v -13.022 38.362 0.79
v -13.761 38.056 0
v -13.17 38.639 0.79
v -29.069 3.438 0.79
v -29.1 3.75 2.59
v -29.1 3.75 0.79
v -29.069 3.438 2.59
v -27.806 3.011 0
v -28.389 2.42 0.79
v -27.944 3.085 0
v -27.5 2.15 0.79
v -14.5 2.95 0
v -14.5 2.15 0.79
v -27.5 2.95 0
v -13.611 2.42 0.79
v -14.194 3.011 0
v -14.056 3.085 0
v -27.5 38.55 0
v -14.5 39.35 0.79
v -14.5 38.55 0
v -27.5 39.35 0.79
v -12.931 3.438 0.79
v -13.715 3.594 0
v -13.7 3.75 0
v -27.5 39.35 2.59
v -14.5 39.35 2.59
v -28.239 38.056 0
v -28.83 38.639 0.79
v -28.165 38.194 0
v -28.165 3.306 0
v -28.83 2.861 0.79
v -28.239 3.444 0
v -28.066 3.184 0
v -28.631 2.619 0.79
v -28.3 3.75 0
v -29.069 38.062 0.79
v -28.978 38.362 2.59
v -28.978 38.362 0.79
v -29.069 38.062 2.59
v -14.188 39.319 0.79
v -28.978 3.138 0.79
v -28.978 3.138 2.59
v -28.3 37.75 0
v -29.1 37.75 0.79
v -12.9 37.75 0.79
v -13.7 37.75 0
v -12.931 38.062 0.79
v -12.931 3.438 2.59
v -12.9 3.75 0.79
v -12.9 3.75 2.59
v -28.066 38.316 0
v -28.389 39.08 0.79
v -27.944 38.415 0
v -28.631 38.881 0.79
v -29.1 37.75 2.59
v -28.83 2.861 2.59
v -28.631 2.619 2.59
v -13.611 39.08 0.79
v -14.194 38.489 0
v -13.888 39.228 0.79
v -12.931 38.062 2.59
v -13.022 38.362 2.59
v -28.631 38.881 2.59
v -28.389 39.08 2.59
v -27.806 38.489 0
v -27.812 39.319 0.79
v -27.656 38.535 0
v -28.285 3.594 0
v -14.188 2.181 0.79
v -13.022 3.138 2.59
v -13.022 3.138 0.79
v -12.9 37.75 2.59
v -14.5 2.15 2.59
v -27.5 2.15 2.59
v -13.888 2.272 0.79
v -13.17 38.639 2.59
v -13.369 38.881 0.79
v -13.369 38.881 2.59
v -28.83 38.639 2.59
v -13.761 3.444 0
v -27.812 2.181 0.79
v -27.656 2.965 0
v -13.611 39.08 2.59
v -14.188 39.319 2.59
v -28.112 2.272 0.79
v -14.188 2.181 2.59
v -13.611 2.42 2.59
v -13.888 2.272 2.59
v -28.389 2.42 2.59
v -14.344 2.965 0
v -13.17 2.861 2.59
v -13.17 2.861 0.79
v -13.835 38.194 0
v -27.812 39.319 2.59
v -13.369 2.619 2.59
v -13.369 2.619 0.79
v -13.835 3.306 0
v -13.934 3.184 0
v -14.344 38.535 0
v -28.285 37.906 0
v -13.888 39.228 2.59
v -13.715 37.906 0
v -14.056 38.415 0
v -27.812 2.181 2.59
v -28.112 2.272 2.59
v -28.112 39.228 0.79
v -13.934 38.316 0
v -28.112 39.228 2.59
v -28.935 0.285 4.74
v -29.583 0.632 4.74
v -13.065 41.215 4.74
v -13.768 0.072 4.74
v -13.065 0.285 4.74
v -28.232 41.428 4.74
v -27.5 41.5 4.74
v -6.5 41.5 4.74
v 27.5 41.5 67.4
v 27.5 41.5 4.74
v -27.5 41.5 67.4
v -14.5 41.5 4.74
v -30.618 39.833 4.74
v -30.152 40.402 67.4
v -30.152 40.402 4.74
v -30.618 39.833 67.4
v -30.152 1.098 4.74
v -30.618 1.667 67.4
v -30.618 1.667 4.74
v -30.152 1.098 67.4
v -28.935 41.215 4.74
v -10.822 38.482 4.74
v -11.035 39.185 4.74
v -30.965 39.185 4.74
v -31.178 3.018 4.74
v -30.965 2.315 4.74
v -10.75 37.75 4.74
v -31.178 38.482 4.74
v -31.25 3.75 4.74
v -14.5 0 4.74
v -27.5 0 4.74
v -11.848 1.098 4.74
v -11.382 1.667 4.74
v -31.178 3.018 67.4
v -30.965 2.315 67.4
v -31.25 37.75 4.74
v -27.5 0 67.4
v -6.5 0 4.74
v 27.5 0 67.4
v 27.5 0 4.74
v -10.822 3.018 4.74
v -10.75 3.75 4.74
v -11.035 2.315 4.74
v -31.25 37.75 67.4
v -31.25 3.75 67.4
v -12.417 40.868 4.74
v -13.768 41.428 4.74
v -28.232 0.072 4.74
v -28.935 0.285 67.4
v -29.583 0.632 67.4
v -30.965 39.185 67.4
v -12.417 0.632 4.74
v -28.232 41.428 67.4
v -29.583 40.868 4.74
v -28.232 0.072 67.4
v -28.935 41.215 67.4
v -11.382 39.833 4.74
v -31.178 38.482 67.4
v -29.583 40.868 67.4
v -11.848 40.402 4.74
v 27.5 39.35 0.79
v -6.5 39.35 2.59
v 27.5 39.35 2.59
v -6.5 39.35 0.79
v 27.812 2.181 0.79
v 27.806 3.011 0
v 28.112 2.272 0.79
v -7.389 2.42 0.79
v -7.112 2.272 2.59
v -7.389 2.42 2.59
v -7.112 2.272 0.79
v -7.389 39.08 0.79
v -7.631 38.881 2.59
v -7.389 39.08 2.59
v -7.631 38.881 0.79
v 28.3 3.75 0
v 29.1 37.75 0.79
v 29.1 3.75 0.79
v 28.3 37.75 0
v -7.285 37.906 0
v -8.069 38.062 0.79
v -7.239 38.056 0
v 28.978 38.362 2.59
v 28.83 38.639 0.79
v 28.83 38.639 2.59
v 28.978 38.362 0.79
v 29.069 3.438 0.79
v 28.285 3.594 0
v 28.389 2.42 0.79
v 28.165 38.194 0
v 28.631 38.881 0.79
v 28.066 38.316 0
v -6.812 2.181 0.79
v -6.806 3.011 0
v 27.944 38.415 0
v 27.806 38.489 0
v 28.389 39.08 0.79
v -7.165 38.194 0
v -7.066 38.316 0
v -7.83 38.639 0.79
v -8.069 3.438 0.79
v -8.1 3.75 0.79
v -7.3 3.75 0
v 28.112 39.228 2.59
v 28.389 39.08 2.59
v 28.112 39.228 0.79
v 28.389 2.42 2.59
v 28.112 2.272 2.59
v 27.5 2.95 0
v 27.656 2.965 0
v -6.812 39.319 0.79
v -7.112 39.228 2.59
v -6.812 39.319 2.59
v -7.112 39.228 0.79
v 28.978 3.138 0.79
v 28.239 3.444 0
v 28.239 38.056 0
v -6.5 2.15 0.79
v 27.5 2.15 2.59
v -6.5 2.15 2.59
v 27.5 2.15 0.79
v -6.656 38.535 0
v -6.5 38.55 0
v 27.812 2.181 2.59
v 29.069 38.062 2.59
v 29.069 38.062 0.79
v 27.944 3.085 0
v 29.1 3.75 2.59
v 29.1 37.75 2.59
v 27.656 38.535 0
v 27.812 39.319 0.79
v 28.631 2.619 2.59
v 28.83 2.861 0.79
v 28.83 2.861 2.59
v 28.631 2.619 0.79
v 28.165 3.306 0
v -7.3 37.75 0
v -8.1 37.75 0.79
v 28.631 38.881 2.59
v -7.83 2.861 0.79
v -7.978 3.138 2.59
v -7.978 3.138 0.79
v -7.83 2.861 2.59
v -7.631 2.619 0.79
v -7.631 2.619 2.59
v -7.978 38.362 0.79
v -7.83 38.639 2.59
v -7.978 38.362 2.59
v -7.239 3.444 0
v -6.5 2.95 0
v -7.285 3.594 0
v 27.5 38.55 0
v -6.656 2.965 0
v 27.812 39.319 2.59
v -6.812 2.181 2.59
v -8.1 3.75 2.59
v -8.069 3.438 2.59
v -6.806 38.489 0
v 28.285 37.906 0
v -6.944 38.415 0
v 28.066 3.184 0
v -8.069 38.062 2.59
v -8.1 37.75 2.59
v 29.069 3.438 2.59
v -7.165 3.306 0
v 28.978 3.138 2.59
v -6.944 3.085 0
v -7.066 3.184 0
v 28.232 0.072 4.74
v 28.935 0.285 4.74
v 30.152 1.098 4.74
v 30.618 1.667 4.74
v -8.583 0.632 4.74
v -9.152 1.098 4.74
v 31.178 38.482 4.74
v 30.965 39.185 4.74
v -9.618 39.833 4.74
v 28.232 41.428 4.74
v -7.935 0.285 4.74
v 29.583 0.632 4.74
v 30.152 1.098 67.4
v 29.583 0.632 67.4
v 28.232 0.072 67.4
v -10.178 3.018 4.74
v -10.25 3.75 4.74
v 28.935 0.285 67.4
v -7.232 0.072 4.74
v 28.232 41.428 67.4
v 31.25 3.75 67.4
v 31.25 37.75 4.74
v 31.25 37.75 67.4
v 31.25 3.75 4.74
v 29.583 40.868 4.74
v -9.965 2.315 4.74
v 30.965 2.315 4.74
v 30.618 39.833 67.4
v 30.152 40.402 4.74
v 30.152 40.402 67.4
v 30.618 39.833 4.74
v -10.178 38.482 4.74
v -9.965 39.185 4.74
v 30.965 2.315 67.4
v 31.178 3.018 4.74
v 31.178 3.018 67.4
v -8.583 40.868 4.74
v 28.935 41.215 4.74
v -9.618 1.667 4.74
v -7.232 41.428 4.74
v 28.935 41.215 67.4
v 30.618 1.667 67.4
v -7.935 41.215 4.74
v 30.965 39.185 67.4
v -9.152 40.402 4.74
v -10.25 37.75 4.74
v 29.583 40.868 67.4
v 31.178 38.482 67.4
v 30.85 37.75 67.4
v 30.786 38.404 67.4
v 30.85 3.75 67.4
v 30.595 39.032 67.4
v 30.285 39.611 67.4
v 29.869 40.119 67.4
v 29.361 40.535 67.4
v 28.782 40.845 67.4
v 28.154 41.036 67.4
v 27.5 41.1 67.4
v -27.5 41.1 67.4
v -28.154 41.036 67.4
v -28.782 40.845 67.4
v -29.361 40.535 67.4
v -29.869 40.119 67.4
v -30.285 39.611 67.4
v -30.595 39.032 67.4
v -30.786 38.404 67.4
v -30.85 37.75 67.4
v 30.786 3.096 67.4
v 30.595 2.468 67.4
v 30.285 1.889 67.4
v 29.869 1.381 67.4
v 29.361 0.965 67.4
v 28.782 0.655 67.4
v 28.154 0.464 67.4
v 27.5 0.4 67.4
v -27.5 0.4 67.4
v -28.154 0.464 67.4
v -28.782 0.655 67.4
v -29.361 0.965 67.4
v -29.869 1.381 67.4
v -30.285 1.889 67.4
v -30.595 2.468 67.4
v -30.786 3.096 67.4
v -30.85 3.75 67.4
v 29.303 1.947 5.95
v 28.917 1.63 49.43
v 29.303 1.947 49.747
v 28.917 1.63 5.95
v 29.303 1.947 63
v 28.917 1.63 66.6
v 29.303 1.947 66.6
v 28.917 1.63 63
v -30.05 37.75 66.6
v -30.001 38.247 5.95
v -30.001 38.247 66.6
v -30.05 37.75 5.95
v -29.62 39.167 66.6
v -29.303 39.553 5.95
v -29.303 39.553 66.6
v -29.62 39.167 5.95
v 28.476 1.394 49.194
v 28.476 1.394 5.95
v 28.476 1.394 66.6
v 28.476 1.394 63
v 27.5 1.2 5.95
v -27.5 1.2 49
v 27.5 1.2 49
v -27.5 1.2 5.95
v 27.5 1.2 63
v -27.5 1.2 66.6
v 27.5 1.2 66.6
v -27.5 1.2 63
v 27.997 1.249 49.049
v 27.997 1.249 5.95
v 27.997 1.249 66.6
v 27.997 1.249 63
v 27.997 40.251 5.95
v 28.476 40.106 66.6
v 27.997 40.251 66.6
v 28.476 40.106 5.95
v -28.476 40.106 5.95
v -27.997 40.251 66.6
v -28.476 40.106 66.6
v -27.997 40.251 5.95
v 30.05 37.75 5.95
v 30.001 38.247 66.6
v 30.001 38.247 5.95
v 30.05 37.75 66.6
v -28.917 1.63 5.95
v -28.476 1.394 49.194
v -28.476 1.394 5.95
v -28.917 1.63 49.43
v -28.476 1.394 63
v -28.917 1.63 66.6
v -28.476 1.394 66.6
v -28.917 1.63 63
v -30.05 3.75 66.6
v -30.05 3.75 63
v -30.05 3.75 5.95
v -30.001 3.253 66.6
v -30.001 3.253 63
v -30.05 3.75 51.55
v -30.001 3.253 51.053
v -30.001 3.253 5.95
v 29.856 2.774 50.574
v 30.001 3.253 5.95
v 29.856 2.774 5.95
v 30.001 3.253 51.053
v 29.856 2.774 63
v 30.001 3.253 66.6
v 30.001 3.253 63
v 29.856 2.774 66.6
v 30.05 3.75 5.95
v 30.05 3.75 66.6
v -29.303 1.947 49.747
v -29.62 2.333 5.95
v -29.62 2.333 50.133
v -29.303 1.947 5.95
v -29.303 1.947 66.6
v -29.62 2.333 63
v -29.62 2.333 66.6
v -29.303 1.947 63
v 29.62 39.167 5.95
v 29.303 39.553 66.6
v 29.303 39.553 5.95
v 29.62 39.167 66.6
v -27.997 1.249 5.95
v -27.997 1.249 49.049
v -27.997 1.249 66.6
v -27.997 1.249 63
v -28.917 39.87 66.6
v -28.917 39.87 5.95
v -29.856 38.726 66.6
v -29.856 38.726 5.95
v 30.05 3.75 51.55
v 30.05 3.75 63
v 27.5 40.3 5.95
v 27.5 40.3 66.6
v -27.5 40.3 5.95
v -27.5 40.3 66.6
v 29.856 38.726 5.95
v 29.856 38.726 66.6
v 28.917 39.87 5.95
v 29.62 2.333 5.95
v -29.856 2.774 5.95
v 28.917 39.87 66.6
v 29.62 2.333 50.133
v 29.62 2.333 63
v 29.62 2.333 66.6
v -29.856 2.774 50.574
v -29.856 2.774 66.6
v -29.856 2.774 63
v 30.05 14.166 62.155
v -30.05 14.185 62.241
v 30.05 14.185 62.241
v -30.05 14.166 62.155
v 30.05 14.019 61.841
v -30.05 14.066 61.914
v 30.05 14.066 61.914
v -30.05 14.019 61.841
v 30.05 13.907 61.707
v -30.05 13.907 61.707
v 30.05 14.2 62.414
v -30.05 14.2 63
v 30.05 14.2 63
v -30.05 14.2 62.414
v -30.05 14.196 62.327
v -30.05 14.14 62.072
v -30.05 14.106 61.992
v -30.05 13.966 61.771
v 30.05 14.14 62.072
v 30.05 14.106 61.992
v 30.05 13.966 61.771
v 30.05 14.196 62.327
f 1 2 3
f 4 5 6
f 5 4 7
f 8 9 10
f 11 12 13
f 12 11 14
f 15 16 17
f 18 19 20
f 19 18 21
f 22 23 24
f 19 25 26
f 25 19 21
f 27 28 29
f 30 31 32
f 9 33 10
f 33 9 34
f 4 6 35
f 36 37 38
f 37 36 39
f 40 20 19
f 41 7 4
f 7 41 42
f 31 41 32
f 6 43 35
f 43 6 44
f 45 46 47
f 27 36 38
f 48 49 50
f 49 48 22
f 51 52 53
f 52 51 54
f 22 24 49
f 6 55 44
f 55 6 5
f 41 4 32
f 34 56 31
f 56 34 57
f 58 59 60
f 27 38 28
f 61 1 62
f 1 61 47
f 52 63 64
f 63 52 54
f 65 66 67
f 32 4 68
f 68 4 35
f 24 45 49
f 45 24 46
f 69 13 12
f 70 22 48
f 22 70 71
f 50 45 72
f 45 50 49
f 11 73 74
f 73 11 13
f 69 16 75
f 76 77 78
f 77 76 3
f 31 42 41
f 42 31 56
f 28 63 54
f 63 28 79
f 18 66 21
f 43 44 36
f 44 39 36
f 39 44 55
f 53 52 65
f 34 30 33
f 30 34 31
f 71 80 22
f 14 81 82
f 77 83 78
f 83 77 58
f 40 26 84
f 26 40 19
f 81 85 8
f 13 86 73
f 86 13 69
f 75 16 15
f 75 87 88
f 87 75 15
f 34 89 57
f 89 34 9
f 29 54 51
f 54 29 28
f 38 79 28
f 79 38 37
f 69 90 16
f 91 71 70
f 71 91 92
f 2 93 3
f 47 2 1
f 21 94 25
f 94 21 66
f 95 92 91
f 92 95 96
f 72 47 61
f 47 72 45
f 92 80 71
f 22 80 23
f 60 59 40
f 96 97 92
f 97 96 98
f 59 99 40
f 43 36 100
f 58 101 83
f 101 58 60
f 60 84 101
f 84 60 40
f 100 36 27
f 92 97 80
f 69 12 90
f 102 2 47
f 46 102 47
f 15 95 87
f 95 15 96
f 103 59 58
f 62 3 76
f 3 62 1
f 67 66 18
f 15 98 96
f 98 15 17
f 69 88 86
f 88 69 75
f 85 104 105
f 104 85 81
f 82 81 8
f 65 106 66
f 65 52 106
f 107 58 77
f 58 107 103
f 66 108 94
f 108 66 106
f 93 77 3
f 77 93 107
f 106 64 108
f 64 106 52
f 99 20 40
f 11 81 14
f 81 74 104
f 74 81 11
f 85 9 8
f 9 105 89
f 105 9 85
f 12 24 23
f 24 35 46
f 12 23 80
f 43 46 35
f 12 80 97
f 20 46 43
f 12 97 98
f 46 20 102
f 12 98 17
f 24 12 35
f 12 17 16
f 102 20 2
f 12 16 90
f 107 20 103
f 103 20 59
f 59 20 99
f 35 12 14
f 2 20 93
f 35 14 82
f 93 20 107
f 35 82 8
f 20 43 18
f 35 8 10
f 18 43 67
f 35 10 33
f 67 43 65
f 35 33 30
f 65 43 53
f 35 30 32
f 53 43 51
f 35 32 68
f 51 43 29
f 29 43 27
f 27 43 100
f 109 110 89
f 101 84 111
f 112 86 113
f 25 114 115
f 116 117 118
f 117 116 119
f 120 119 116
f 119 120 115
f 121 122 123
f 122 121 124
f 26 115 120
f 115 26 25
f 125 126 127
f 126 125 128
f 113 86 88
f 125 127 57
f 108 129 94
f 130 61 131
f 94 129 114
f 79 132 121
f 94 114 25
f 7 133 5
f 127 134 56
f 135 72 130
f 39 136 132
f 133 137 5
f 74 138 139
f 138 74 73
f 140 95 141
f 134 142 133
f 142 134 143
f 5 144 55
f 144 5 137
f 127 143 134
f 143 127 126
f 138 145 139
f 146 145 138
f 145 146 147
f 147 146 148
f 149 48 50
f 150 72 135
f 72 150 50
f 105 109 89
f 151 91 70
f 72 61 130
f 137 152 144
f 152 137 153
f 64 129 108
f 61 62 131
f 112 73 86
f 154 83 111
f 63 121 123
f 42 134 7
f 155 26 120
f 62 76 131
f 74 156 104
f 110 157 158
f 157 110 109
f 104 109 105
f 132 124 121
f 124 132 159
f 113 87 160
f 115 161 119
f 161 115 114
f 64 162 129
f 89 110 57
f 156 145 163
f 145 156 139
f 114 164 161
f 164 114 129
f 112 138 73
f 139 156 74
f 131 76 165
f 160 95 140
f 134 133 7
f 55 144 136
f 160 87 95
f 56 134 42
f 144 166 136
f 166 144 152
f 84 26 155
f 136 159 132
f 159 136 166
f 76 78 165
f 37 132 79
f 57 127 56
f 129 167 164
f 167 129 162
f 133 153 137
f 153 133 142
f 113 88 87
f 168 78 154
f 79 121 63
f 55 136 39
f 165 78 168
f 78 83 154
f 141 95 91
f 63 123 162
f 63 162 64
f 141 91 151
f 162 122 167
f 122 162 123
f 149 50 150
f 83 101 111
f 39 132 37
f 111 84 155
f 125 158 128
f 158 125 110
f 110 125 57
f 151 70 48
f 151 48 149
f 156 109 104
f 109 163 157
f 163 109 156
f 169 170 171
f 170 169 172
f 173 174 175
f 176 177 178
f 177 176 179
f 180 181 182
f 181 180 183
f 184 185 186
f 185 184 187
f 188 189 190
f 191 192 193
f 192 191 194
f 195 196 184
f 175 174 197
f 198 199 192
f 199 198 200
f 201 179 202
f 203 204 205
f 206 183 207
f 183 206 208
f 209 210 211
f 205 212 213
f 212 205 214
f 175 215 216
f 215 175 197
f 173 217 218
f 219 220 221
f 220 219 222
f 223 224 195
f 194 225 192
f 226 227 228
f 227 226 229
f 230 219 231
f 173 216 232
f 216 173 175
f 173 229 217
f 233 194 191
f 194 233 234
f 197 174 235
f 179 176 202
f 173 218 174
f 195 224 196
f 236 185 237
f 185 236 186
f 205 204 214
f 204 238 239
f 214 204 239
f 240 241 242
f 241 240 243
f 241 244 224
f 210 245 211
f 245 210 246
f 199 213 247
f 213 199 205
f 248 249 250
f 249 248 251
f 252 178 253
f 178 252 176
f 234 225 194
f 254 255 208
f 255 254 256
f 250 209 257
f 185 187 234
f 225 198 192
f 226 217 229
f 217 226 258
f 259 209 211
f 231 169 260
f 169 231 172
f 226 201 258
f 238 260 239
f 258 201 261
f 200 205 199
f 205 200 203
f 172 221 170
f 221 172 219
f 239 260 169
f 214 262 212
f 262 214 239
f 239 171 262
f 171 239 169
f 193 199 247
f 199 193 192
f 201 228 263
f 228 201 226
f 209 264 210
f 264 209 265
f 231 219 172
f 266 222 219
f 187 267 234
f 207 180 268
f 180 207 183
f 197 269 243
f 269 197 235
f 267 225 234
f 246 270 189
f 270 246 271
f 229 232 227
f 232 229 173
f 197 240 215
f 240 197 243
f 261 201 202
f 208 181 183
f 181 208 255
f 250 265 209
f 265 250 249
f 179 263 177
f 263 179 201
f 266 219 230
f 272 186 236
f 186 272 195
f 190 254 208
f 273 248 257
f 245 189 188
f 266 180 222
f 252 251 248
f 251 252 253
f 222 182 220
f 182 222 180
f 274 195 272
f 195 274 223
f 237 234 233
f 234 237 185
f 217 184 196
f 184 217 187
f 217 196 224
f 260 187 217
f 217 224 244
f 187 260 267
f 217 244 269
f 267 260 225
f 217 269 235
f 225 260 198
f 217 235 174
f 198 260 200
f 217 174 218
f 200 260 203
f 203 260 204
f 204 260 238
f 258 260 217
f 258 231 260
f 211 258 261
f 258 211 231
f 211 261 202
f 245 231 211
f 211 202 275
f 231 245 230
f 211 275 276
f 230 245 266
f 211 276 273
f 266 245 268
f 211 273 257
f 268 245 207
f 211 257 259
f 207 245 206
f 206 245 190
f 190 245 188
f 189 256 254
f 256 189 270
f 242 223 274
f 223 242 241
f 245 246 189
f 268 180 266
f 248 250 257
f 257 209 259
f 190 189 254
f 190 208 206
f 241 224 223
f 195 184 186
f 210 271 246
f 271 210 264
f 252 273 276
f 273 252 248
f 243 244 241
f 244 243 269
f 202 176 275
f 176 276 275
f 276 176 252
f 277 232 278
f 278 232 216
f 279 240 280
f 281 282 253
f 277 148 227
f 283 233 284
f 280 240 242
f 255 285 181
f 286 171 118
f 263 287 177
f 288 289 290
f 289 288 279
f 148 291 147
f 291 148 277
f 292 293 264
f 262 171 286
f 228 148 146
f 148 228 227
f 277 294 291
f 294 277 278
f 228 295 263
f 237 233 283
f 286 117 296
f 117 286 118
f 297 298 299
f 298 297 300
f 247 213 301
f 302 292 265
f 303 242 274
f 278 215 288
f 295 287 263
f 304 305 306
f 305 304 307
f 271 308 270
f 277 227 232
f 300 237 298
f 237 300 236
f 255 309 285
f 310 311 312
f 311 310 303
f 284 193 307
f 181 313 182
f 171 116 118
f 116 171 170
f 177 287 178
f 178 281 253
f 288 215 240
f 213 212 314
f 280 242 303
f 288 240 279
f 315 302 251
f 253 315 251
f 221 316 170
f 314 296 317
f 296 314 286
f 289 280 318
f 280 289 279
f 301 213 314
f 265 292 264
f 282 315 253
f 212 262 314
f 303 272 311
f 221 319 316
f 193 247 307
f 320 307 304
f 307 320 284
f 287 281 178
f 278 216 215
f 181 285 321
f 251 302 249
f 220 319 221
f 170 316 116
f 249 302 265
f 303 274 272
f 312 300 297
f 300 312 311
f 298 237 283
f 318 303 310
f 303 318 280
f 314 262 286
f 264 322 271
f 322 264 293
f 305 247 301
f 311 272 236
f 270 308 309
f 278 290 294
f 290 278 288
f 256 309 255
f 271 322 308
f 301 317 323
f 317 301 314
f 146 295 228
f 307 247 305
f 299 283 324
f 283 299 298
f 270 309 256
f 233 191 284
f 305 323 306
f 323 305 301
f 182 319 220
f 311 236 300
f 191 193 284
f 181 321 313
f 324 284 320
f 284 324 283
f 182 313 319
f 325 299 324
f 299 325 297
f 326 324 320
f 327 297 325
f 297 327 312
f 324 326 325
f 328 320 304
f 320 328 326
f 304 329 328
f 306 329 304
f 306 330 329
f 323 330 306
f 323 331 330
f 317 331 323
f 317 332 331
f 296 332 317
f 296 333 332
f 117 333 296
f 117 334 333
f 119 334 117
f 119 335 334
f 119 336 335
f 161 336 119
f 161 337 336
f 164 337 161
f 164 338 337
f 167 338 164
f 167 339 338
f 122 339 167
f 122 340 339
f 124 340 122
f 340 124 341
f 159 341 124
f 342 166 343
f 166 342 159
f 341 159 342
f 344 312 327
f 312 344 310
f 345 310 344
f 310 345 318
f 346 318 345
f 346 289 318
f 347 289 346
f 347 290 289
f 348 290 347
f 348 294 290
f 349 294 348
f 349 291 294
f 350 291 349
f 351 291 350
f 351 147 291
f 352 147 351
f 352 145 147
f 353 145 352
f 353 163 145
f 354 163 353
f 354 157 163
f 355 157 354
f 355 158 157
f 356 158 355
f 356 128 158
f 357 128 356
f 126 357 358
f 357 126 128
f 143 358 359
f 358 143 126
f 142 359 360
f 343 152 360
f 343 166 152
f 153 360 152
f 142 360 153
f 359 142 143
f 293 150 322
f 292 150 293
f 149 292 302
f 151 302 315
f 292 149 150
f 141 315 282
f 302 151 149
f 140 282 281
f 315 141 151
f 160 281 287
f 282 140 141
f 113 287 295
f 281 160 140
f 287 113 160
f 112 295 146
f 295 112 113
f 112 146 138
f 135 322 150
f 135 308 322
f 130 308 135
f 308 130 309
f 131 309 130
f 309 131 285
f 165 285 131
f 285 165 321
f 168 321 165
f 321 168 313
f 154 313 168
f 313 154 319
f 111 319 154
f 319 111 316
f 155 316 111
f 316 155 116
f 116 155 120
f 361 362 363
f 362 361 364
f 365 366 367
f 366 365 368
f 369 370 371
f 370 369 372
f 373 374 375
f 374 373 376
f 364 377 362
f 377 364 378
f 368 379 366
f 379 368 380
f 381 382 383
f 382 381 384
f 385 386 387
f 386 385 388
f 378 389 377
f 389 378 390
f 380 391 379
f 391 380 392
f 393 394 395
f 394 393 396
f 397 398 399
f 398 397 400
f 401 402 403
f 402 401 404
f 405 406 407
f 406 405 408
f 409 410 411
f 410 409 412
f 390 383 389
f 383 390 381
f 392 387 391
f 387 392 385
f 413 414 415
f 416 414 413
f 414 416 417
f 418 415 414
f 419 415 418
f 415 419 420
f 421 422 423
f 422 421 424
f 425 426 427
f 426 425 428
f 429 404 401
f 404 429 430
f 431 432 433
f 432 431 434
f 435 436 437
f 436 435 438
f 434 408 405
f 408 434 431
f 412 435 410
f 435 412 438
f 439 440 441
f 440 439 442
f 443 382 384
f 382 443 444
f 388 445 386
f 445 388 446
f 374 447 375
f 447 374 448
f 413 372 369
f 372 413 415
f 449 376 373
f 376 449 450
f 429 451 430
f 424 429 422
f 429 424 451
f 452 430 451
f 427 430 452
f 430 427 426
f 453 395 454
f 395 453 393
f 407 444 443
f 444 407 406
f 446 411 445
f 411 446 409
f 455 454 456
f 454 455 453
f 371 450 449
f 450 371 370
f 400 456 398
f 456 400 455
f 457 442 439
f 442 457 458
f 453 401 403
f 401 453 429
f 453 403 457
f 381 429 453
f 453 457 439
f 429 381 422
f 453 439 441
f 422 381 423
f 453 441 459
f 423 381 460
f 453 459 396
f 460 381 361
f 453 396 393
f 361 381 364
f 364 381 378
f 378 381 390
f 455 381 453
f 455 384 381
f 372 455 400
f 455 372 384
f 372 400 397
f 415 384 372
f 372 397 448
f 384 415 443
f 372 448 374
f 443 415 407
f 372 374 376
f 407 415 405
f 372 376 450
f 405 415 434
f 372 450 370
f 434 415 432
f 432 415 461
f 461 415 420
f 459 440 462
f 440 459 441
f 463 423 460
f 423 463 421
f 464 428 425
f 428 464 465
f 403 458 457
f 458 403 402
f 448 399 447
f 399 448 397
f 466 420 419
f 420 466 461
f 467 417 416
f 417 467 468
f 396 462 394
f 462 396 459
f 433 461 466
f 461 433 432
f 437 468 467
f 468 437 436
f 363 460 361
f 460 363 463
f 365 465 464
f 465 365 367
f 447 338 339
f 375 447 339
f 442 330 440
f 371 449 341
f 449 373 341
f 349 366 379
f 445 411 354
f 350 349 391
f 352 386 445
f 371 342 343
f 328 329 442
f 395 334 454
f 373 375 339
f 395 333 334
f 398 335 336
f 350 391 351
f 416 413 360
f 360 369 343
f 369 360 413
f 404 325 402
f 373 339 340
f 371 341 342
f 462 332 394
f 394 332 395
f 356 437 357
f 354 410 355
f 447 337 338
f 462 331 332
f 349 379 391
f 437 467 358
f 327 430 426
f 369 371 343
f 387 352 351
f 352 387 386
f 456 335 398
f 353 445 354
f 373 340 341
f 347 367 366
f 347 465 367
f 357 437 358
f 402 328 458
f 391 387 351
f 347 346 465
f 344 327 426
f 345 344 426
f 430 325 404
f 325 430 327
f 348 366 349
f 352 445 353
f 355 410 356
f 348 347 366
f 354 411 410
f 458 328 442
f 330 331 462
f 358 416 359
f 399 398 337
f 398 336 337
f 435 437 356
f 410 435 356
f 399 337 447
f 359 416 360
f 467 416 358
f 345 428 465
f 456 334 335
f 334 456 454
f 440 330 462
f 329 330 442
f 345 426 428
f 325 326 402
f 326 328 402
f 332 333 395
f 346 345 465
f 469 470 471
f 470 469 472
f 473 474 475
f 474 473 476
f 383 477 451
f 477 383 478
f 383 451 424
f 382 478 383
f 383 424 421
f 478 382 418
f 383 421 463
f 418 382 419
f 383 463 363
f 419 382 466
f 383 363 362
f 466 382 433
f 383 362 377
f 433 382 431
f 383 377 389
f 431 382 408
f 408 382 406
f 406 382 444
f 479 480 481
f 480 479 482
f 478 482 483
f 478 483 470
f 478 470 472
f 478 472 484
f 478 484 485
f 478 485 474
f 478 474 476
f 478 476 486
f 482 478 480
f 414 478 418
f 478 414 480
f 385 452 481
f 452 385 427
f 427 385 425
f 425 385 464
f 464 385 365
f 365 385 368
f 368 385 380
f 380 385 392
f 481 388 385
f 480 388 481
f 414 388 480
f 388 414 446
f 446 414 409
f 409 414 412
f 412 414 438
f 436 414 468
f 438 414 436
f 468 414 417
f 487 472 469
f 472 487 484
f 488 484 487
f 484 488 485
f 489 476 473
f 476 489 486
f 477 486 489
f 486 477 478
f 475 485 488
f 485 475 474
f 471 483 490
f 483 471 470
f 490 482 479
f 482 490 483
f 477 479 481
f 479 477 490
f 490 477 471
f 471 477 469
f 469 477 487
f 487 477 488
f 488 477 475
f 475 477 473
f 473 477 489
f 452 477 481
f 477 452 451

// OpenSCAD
// file: ../../../modules/gridfinity.scad
// Gridfinity ベースプレートの共有 module。
// 寸法は Gridfinity 仕様 (Zack Freedman) の baseplate 輪郭に従う:
//   ピッチ 42、ソケット上端開口 41.5 (角 R4)、上から 45° 面取り 2.15 →
//   垂直 1.8 (37.2 角・R1.85) → 45° 面取り 0.7 → 底 35.8 角 (R1.15)。
//   ソケット深さ = 2.15 + 1.8 + 0.7 = 4.65。
//
// 座標系: X が列方向 (中央が 0)、Y が行方向 (板の前端が 0)、Z=0 が板の底面。
// 板の外形は grid とは独立に rim で与えるので、grid より大きい板 (縁付き) を
// 作れる。ソケットは rim=[left, right, front, back] の内側へ 42 ピッチで並ぶ。

gf_pitch = 42;
gf_socket_top = 41.5; // 上端開口
gf_socket_mid = 37.2; // 垂直部
gf_socket_bot = 35.8; // 底
gf_socket_r_top = 4;
gf_socket_r_mid = 1.85;
gf_socket_r_bot = 1.15;
gf_chamfer_top = 2.15;
gf_wall_h = 1.8;
gf_chamfer_bot = 0.7;
gf_socket_depth = gf_chamfer_top + gf_wall_h + gf_chamfer_bot; // 4.65
gf_fn = 32;
gf_eps = 0.01; // hull 用の薄板の厚さ
gf_over = 0.5; // 切削の抜き代

// 角丸正方形または矩形 (w は一辺、または [幅, 奥行き]、角 R)
module
gf_rounded_square(w, r)
{
    offset(r = r, $fn = gf_fn)
        square(is_list(w) ? w - [ 2 * r, 2 * r ] : w - 2 * r, center = true);
}

// 厚さ gf_eps の角丸正方形の薄板を z に置く (hull の骨)
module
gf_slab(w, r, z)
{
    translate([ 0, 0, z ]) linear_extrude(gf_eps) gf_rounded_square(w, r);
}

// ソケット1個の切削体。z=0 がソケットの底 (床の天面)、+Z へ 4.65 で天面に出る。
// clearance は嵌合の逃げで、輪郭を全周へ clearance だけ外へ出す (幅 +2c、角 R
// +c)。pitch_x は X 方向のセル幅。端数でも角 R と面取りの寸法を保つ。
module
gf_socket_cut(clearance = 0, pitch_x = gf_pitch)
{
    z1 = gf_chamfer_bot;
    z2 = z1 + gf_wall_h;
    z3 = gf_socket_depth;
    c = clearance;
    assert(pitch_x > gf_pitch - gf_socket_top + 2 * gf_socket_r_top,
           "Cell width is too small for the socket corner radius");
    delta = [ pitch_x - gf_pitch, 0 ];
    bot = [ gf_socket_bot + 2 * c, gf_socket_bot + 2 * c ] + delta;
    mid = [ gf_socket_mid + 2 * c, gf_socket_mid + 2 * c ] + delta;
    top = [ gf_socket_top + 2 * c, gf_socket_top + 2 * c ] + delta;
    hull()
    {
        gf_slab(bot, gf_socket_r_bot + c, 0);
        gf_slab(mid, gf_socket_r_mid + c, z1 - gf_eps);
    }
    hull()
    {
        gf_slab(mid, gf_socket_r_mid + c, z1 - gf_eps);
        gf_slab(mid, gf_socket_r_mid + c, z2 - gf_eps);
    }
    hull()
    {
        gf_slab(mid, gf_socket_r_mid + c, z2 - gf_eps);
        gf_slab(top, gf_socket_r_top + c, z3 - gf_eps);
    }
    // 天面より上へ抜く (天面と同一平面の退化した面を残さない)
    gf_slab(top, gf_socket_r_top + c, z3 - gf_eps);
    translate([ 0, 0, z3 - gf_eps ]) linear_extrude(gf_over + gf_eps)
        gf_rounded_square(top, gf_socket_r_top + c);
}

// ベースプレート。cols x rows のソケットを床 floor_t の上に彫る。
// rim = [left, right, front, back] はソケット列の外側に残す縁の幅。
// 板の幅 = cols*42 + left + right、奥行き = rows*42 + front + back。
// cols の端数は左端の細幅セルになる。rows は正の整数。
// clearance はソケットの嵌合の逃げ (gf_socket_cut を参照)。
module
gf_baseplate(cols, rows, rim = [ 0, 0, 0, 0 ], floor_t = 1, clearance = 0)
{
    grid_w = cols * gf_pitch;
    grid_d = rows * gf_pitch;
    plate_w = grid_w + rim[0] + rim[1];
    plate_d = grid_d + rim[2] + rim[3];
    x0 = -plate_w / 2 + rim[0]; // ソケット列の左端
    first_pitch = grid_w - (ceil(cols) - 1) * gf_pitch;
    difference()
    {
        translate([ -plate_w / 2, 0, 0 ])
            cube([ plate_w, plate_d, floor_t + gf_socket_depth ]);
        for (c = [0:ceil(cols) - 1], r = [0:rows - 1])
            translate([
                x0 + (c == 0 ? first_pitch / 2
                             : first_pitch + (c - 0.5) * gf_pitch),
                rim[2] + (r + 0.5) * gf_pitch,
                floor_t
            ]) gf_socket_cut(clearance, c == 0 ? first_pitch : gf_pitch);
    }
}
// file: ../../../modules/gridfinity_bins.scad
include <gridfinity_bin.scad>

// assets/gridfinity-bin/ の bin 群の共通値と、サイズ 3 引数の払い出し口。
// 単体では何も描かない。設計の経緯と確定値は
// ledger/designs/gridfinity-bin-4u.md が正本。
// 通常binは4U/9U、X={1,1.5,2,2.5,3} × Y={1,2,3,4,5,5.5}。
// 両軸に端数を持つ組み合わせはassetに置かない（各高さ28種）。
// Xが横、Yがラベルの壁から奥、unitsが高さ（7mm単位）。
wall = 1.2;    // 0.4 ノズル 3 本
floor_t = 1.2; // 底 (4.75) の上に載せる床。床の天面 z = 5.95
label_d = 13;  // 12mm 幅のラベルシールを貼る天板の張り出し
label_t = 1; // 天板の厚さ (user 指定)。下は 45° の無垢のくさび
label_r = 1; // 天板の先端と 45° 面の境目の R (user 指定)
// カードケース (goods/card_case_2x3x4u.scad) の値。カードは ISO/IEC 7810 ID-1 (85.6 × 54 ×
// 0.76、隅 R3) で、長辺を Y (rows 方向) に寝かせ、X 中央・手前の壁から 10 奥に置く。ポケットは
// カードより 1 大きい (片側 0.5)。右奥のマスは壁の内面まで抜き、床と底を外形に平行な 45° の窪みにする。
// ポケットの左右の埋めの天面 (幅 13.05) が 12mm のラベルを貼る帯。ポケットと穴の交点の
// 縦エッジは丸める (開口の上縁は丸めない: 壁を上端まで垂直に保ち、収まる枚数を減らさない)
card_w = 54;    // カードの短辺 (X)。user 指定「高さ 54」
card_d = 85.6;  // カードの長辺 (Y)。user 指定「幅 85.6」
card_clear = 1; // ポケットの余裕 (user 指定「+1mm」)
// ポケットの手前の辺の、手前の壁の内面からの距離 (user 指定「10mm」)
card_off = 10;
// ポケットの平面の隅 R (user 指定「角の丸み 3mm」。ID-1 の隅は 2.88..3.48)
card_r = 3;
// ポケットと穴が交わる所の、埋めの凸の縦エッジの R (指の当たる角)
card_edge_r = 2;
recess_skin = floor_t + 1.75; // 窪みの床 z (底の皮)。user 指定「壁厚と同じ 1.2 は過剰、1.75 返す」

function bin_contract(cols, rows, units) = str("CONTRACT units=",
                                               units,
                                               " pitch=",
                                               gf_pitch,
                                               " outer=",
                                               gfb_outer,
                                               " h=",
                                               units* gfb_unit,
                                               " lip=",
                                               gfb_lip_h,
                                               " base=",
                                               gfb_base_bot,
                                               "/",
                                               gfb_base_mid,
                                               "/",
                                               gfb_outer,
                                               " base_h=",
                                               gfb_base_h,
                                               " wall=",
                                               wall,
                                               " floor_top=",
                                               gfb_base_h + floor_t,
                                               " label=",
                                               label_d,
                                               "x",
                                               label_t,
                                               " wedge=45 fillet=",
                                               label_r,
                                               " bin=",
                                               cols,
                                               "x",
                                               rows,
                                               " size=",
                                               cols* gf_pitch - 0.5,
                                               "x",
                                               rows* gf_pitch - 0.5);

// (cols, rows, units) でラベル付き bin を払い出す。例: gridfinity_bin(2, 4, 4)
module
gridfinity_bin(cols, rows, units = 4)
{
    echo(bin_contract(cols, rows, units));
    gfb_bin(cols, rows, units, wall, floor_t, label_d, label_t, label_r);
}

function card_contract(cols, rows, units) = str("CONTRACT card units=",
                                                units,
                                                " bin=",
                                                cols,
                                                "x",
                                                rows,
                                                " size=",
                                                cols* gf_pitch - 0.5,
                                                "x",
                                                rows* gf_pitch - 0.5,
                                                " h=",
                                                units* gfb_unit,
                                                " lip=",
                                                gfb_lip_h,
                                                " floor_top=",
                                                gfb_base_h + floor_t,
                                                " card=",
                                                card_w,
                                                "x",
                                                card_d,
                                                " pocket=",
                                                card_w + card_clear,
                                                "x",
                                                card_d + card_clear,
                                                " at=",
                                                -(card_w + card_clear) / 2,
                                                ",",
                                                wall + card_off,
                                                " hole=",
                                                (cols - 1) / 2 * gf_pitch - gfb_outer / 2,
                                                ",",
                                                (rows - 0.5) * gf_pitch - 0.25 - gfb_outer / 2,
                                                " hole_r=",
                                                gfb_outer_r - wall,
                                                " recess=",
                                                gfb_outer - 2 * wall,
                                                "/",
                                                gfb_base_mid - 2 * wall,
                                                " recess_floor=",
                                                recess_skin,
                                                " r=",
                                                card_r,
                                                " edge_r=",
                                                card_edge_r);

// (cols, rows, units) でカードケースを払い出す。例: gridfinity_card_case(2, 3, 4)
module
gridfinity_card_case(cols, rows, units = 4)
{
    echo(card_contract(cols, rows, units));
    gfb_card_case(cols,
                  rows,
                  units,
                  wall,
                  floor_t,
                  [ card_w, card_d ],
                  card_clear,
                  card_off,
                  card_r,
                  recess_skin,
                  card_edge_r);
}
// main file
include <../../../modules/gridfinity_bins.scad>

gridfinity_bin(1.5, 1, 9);
